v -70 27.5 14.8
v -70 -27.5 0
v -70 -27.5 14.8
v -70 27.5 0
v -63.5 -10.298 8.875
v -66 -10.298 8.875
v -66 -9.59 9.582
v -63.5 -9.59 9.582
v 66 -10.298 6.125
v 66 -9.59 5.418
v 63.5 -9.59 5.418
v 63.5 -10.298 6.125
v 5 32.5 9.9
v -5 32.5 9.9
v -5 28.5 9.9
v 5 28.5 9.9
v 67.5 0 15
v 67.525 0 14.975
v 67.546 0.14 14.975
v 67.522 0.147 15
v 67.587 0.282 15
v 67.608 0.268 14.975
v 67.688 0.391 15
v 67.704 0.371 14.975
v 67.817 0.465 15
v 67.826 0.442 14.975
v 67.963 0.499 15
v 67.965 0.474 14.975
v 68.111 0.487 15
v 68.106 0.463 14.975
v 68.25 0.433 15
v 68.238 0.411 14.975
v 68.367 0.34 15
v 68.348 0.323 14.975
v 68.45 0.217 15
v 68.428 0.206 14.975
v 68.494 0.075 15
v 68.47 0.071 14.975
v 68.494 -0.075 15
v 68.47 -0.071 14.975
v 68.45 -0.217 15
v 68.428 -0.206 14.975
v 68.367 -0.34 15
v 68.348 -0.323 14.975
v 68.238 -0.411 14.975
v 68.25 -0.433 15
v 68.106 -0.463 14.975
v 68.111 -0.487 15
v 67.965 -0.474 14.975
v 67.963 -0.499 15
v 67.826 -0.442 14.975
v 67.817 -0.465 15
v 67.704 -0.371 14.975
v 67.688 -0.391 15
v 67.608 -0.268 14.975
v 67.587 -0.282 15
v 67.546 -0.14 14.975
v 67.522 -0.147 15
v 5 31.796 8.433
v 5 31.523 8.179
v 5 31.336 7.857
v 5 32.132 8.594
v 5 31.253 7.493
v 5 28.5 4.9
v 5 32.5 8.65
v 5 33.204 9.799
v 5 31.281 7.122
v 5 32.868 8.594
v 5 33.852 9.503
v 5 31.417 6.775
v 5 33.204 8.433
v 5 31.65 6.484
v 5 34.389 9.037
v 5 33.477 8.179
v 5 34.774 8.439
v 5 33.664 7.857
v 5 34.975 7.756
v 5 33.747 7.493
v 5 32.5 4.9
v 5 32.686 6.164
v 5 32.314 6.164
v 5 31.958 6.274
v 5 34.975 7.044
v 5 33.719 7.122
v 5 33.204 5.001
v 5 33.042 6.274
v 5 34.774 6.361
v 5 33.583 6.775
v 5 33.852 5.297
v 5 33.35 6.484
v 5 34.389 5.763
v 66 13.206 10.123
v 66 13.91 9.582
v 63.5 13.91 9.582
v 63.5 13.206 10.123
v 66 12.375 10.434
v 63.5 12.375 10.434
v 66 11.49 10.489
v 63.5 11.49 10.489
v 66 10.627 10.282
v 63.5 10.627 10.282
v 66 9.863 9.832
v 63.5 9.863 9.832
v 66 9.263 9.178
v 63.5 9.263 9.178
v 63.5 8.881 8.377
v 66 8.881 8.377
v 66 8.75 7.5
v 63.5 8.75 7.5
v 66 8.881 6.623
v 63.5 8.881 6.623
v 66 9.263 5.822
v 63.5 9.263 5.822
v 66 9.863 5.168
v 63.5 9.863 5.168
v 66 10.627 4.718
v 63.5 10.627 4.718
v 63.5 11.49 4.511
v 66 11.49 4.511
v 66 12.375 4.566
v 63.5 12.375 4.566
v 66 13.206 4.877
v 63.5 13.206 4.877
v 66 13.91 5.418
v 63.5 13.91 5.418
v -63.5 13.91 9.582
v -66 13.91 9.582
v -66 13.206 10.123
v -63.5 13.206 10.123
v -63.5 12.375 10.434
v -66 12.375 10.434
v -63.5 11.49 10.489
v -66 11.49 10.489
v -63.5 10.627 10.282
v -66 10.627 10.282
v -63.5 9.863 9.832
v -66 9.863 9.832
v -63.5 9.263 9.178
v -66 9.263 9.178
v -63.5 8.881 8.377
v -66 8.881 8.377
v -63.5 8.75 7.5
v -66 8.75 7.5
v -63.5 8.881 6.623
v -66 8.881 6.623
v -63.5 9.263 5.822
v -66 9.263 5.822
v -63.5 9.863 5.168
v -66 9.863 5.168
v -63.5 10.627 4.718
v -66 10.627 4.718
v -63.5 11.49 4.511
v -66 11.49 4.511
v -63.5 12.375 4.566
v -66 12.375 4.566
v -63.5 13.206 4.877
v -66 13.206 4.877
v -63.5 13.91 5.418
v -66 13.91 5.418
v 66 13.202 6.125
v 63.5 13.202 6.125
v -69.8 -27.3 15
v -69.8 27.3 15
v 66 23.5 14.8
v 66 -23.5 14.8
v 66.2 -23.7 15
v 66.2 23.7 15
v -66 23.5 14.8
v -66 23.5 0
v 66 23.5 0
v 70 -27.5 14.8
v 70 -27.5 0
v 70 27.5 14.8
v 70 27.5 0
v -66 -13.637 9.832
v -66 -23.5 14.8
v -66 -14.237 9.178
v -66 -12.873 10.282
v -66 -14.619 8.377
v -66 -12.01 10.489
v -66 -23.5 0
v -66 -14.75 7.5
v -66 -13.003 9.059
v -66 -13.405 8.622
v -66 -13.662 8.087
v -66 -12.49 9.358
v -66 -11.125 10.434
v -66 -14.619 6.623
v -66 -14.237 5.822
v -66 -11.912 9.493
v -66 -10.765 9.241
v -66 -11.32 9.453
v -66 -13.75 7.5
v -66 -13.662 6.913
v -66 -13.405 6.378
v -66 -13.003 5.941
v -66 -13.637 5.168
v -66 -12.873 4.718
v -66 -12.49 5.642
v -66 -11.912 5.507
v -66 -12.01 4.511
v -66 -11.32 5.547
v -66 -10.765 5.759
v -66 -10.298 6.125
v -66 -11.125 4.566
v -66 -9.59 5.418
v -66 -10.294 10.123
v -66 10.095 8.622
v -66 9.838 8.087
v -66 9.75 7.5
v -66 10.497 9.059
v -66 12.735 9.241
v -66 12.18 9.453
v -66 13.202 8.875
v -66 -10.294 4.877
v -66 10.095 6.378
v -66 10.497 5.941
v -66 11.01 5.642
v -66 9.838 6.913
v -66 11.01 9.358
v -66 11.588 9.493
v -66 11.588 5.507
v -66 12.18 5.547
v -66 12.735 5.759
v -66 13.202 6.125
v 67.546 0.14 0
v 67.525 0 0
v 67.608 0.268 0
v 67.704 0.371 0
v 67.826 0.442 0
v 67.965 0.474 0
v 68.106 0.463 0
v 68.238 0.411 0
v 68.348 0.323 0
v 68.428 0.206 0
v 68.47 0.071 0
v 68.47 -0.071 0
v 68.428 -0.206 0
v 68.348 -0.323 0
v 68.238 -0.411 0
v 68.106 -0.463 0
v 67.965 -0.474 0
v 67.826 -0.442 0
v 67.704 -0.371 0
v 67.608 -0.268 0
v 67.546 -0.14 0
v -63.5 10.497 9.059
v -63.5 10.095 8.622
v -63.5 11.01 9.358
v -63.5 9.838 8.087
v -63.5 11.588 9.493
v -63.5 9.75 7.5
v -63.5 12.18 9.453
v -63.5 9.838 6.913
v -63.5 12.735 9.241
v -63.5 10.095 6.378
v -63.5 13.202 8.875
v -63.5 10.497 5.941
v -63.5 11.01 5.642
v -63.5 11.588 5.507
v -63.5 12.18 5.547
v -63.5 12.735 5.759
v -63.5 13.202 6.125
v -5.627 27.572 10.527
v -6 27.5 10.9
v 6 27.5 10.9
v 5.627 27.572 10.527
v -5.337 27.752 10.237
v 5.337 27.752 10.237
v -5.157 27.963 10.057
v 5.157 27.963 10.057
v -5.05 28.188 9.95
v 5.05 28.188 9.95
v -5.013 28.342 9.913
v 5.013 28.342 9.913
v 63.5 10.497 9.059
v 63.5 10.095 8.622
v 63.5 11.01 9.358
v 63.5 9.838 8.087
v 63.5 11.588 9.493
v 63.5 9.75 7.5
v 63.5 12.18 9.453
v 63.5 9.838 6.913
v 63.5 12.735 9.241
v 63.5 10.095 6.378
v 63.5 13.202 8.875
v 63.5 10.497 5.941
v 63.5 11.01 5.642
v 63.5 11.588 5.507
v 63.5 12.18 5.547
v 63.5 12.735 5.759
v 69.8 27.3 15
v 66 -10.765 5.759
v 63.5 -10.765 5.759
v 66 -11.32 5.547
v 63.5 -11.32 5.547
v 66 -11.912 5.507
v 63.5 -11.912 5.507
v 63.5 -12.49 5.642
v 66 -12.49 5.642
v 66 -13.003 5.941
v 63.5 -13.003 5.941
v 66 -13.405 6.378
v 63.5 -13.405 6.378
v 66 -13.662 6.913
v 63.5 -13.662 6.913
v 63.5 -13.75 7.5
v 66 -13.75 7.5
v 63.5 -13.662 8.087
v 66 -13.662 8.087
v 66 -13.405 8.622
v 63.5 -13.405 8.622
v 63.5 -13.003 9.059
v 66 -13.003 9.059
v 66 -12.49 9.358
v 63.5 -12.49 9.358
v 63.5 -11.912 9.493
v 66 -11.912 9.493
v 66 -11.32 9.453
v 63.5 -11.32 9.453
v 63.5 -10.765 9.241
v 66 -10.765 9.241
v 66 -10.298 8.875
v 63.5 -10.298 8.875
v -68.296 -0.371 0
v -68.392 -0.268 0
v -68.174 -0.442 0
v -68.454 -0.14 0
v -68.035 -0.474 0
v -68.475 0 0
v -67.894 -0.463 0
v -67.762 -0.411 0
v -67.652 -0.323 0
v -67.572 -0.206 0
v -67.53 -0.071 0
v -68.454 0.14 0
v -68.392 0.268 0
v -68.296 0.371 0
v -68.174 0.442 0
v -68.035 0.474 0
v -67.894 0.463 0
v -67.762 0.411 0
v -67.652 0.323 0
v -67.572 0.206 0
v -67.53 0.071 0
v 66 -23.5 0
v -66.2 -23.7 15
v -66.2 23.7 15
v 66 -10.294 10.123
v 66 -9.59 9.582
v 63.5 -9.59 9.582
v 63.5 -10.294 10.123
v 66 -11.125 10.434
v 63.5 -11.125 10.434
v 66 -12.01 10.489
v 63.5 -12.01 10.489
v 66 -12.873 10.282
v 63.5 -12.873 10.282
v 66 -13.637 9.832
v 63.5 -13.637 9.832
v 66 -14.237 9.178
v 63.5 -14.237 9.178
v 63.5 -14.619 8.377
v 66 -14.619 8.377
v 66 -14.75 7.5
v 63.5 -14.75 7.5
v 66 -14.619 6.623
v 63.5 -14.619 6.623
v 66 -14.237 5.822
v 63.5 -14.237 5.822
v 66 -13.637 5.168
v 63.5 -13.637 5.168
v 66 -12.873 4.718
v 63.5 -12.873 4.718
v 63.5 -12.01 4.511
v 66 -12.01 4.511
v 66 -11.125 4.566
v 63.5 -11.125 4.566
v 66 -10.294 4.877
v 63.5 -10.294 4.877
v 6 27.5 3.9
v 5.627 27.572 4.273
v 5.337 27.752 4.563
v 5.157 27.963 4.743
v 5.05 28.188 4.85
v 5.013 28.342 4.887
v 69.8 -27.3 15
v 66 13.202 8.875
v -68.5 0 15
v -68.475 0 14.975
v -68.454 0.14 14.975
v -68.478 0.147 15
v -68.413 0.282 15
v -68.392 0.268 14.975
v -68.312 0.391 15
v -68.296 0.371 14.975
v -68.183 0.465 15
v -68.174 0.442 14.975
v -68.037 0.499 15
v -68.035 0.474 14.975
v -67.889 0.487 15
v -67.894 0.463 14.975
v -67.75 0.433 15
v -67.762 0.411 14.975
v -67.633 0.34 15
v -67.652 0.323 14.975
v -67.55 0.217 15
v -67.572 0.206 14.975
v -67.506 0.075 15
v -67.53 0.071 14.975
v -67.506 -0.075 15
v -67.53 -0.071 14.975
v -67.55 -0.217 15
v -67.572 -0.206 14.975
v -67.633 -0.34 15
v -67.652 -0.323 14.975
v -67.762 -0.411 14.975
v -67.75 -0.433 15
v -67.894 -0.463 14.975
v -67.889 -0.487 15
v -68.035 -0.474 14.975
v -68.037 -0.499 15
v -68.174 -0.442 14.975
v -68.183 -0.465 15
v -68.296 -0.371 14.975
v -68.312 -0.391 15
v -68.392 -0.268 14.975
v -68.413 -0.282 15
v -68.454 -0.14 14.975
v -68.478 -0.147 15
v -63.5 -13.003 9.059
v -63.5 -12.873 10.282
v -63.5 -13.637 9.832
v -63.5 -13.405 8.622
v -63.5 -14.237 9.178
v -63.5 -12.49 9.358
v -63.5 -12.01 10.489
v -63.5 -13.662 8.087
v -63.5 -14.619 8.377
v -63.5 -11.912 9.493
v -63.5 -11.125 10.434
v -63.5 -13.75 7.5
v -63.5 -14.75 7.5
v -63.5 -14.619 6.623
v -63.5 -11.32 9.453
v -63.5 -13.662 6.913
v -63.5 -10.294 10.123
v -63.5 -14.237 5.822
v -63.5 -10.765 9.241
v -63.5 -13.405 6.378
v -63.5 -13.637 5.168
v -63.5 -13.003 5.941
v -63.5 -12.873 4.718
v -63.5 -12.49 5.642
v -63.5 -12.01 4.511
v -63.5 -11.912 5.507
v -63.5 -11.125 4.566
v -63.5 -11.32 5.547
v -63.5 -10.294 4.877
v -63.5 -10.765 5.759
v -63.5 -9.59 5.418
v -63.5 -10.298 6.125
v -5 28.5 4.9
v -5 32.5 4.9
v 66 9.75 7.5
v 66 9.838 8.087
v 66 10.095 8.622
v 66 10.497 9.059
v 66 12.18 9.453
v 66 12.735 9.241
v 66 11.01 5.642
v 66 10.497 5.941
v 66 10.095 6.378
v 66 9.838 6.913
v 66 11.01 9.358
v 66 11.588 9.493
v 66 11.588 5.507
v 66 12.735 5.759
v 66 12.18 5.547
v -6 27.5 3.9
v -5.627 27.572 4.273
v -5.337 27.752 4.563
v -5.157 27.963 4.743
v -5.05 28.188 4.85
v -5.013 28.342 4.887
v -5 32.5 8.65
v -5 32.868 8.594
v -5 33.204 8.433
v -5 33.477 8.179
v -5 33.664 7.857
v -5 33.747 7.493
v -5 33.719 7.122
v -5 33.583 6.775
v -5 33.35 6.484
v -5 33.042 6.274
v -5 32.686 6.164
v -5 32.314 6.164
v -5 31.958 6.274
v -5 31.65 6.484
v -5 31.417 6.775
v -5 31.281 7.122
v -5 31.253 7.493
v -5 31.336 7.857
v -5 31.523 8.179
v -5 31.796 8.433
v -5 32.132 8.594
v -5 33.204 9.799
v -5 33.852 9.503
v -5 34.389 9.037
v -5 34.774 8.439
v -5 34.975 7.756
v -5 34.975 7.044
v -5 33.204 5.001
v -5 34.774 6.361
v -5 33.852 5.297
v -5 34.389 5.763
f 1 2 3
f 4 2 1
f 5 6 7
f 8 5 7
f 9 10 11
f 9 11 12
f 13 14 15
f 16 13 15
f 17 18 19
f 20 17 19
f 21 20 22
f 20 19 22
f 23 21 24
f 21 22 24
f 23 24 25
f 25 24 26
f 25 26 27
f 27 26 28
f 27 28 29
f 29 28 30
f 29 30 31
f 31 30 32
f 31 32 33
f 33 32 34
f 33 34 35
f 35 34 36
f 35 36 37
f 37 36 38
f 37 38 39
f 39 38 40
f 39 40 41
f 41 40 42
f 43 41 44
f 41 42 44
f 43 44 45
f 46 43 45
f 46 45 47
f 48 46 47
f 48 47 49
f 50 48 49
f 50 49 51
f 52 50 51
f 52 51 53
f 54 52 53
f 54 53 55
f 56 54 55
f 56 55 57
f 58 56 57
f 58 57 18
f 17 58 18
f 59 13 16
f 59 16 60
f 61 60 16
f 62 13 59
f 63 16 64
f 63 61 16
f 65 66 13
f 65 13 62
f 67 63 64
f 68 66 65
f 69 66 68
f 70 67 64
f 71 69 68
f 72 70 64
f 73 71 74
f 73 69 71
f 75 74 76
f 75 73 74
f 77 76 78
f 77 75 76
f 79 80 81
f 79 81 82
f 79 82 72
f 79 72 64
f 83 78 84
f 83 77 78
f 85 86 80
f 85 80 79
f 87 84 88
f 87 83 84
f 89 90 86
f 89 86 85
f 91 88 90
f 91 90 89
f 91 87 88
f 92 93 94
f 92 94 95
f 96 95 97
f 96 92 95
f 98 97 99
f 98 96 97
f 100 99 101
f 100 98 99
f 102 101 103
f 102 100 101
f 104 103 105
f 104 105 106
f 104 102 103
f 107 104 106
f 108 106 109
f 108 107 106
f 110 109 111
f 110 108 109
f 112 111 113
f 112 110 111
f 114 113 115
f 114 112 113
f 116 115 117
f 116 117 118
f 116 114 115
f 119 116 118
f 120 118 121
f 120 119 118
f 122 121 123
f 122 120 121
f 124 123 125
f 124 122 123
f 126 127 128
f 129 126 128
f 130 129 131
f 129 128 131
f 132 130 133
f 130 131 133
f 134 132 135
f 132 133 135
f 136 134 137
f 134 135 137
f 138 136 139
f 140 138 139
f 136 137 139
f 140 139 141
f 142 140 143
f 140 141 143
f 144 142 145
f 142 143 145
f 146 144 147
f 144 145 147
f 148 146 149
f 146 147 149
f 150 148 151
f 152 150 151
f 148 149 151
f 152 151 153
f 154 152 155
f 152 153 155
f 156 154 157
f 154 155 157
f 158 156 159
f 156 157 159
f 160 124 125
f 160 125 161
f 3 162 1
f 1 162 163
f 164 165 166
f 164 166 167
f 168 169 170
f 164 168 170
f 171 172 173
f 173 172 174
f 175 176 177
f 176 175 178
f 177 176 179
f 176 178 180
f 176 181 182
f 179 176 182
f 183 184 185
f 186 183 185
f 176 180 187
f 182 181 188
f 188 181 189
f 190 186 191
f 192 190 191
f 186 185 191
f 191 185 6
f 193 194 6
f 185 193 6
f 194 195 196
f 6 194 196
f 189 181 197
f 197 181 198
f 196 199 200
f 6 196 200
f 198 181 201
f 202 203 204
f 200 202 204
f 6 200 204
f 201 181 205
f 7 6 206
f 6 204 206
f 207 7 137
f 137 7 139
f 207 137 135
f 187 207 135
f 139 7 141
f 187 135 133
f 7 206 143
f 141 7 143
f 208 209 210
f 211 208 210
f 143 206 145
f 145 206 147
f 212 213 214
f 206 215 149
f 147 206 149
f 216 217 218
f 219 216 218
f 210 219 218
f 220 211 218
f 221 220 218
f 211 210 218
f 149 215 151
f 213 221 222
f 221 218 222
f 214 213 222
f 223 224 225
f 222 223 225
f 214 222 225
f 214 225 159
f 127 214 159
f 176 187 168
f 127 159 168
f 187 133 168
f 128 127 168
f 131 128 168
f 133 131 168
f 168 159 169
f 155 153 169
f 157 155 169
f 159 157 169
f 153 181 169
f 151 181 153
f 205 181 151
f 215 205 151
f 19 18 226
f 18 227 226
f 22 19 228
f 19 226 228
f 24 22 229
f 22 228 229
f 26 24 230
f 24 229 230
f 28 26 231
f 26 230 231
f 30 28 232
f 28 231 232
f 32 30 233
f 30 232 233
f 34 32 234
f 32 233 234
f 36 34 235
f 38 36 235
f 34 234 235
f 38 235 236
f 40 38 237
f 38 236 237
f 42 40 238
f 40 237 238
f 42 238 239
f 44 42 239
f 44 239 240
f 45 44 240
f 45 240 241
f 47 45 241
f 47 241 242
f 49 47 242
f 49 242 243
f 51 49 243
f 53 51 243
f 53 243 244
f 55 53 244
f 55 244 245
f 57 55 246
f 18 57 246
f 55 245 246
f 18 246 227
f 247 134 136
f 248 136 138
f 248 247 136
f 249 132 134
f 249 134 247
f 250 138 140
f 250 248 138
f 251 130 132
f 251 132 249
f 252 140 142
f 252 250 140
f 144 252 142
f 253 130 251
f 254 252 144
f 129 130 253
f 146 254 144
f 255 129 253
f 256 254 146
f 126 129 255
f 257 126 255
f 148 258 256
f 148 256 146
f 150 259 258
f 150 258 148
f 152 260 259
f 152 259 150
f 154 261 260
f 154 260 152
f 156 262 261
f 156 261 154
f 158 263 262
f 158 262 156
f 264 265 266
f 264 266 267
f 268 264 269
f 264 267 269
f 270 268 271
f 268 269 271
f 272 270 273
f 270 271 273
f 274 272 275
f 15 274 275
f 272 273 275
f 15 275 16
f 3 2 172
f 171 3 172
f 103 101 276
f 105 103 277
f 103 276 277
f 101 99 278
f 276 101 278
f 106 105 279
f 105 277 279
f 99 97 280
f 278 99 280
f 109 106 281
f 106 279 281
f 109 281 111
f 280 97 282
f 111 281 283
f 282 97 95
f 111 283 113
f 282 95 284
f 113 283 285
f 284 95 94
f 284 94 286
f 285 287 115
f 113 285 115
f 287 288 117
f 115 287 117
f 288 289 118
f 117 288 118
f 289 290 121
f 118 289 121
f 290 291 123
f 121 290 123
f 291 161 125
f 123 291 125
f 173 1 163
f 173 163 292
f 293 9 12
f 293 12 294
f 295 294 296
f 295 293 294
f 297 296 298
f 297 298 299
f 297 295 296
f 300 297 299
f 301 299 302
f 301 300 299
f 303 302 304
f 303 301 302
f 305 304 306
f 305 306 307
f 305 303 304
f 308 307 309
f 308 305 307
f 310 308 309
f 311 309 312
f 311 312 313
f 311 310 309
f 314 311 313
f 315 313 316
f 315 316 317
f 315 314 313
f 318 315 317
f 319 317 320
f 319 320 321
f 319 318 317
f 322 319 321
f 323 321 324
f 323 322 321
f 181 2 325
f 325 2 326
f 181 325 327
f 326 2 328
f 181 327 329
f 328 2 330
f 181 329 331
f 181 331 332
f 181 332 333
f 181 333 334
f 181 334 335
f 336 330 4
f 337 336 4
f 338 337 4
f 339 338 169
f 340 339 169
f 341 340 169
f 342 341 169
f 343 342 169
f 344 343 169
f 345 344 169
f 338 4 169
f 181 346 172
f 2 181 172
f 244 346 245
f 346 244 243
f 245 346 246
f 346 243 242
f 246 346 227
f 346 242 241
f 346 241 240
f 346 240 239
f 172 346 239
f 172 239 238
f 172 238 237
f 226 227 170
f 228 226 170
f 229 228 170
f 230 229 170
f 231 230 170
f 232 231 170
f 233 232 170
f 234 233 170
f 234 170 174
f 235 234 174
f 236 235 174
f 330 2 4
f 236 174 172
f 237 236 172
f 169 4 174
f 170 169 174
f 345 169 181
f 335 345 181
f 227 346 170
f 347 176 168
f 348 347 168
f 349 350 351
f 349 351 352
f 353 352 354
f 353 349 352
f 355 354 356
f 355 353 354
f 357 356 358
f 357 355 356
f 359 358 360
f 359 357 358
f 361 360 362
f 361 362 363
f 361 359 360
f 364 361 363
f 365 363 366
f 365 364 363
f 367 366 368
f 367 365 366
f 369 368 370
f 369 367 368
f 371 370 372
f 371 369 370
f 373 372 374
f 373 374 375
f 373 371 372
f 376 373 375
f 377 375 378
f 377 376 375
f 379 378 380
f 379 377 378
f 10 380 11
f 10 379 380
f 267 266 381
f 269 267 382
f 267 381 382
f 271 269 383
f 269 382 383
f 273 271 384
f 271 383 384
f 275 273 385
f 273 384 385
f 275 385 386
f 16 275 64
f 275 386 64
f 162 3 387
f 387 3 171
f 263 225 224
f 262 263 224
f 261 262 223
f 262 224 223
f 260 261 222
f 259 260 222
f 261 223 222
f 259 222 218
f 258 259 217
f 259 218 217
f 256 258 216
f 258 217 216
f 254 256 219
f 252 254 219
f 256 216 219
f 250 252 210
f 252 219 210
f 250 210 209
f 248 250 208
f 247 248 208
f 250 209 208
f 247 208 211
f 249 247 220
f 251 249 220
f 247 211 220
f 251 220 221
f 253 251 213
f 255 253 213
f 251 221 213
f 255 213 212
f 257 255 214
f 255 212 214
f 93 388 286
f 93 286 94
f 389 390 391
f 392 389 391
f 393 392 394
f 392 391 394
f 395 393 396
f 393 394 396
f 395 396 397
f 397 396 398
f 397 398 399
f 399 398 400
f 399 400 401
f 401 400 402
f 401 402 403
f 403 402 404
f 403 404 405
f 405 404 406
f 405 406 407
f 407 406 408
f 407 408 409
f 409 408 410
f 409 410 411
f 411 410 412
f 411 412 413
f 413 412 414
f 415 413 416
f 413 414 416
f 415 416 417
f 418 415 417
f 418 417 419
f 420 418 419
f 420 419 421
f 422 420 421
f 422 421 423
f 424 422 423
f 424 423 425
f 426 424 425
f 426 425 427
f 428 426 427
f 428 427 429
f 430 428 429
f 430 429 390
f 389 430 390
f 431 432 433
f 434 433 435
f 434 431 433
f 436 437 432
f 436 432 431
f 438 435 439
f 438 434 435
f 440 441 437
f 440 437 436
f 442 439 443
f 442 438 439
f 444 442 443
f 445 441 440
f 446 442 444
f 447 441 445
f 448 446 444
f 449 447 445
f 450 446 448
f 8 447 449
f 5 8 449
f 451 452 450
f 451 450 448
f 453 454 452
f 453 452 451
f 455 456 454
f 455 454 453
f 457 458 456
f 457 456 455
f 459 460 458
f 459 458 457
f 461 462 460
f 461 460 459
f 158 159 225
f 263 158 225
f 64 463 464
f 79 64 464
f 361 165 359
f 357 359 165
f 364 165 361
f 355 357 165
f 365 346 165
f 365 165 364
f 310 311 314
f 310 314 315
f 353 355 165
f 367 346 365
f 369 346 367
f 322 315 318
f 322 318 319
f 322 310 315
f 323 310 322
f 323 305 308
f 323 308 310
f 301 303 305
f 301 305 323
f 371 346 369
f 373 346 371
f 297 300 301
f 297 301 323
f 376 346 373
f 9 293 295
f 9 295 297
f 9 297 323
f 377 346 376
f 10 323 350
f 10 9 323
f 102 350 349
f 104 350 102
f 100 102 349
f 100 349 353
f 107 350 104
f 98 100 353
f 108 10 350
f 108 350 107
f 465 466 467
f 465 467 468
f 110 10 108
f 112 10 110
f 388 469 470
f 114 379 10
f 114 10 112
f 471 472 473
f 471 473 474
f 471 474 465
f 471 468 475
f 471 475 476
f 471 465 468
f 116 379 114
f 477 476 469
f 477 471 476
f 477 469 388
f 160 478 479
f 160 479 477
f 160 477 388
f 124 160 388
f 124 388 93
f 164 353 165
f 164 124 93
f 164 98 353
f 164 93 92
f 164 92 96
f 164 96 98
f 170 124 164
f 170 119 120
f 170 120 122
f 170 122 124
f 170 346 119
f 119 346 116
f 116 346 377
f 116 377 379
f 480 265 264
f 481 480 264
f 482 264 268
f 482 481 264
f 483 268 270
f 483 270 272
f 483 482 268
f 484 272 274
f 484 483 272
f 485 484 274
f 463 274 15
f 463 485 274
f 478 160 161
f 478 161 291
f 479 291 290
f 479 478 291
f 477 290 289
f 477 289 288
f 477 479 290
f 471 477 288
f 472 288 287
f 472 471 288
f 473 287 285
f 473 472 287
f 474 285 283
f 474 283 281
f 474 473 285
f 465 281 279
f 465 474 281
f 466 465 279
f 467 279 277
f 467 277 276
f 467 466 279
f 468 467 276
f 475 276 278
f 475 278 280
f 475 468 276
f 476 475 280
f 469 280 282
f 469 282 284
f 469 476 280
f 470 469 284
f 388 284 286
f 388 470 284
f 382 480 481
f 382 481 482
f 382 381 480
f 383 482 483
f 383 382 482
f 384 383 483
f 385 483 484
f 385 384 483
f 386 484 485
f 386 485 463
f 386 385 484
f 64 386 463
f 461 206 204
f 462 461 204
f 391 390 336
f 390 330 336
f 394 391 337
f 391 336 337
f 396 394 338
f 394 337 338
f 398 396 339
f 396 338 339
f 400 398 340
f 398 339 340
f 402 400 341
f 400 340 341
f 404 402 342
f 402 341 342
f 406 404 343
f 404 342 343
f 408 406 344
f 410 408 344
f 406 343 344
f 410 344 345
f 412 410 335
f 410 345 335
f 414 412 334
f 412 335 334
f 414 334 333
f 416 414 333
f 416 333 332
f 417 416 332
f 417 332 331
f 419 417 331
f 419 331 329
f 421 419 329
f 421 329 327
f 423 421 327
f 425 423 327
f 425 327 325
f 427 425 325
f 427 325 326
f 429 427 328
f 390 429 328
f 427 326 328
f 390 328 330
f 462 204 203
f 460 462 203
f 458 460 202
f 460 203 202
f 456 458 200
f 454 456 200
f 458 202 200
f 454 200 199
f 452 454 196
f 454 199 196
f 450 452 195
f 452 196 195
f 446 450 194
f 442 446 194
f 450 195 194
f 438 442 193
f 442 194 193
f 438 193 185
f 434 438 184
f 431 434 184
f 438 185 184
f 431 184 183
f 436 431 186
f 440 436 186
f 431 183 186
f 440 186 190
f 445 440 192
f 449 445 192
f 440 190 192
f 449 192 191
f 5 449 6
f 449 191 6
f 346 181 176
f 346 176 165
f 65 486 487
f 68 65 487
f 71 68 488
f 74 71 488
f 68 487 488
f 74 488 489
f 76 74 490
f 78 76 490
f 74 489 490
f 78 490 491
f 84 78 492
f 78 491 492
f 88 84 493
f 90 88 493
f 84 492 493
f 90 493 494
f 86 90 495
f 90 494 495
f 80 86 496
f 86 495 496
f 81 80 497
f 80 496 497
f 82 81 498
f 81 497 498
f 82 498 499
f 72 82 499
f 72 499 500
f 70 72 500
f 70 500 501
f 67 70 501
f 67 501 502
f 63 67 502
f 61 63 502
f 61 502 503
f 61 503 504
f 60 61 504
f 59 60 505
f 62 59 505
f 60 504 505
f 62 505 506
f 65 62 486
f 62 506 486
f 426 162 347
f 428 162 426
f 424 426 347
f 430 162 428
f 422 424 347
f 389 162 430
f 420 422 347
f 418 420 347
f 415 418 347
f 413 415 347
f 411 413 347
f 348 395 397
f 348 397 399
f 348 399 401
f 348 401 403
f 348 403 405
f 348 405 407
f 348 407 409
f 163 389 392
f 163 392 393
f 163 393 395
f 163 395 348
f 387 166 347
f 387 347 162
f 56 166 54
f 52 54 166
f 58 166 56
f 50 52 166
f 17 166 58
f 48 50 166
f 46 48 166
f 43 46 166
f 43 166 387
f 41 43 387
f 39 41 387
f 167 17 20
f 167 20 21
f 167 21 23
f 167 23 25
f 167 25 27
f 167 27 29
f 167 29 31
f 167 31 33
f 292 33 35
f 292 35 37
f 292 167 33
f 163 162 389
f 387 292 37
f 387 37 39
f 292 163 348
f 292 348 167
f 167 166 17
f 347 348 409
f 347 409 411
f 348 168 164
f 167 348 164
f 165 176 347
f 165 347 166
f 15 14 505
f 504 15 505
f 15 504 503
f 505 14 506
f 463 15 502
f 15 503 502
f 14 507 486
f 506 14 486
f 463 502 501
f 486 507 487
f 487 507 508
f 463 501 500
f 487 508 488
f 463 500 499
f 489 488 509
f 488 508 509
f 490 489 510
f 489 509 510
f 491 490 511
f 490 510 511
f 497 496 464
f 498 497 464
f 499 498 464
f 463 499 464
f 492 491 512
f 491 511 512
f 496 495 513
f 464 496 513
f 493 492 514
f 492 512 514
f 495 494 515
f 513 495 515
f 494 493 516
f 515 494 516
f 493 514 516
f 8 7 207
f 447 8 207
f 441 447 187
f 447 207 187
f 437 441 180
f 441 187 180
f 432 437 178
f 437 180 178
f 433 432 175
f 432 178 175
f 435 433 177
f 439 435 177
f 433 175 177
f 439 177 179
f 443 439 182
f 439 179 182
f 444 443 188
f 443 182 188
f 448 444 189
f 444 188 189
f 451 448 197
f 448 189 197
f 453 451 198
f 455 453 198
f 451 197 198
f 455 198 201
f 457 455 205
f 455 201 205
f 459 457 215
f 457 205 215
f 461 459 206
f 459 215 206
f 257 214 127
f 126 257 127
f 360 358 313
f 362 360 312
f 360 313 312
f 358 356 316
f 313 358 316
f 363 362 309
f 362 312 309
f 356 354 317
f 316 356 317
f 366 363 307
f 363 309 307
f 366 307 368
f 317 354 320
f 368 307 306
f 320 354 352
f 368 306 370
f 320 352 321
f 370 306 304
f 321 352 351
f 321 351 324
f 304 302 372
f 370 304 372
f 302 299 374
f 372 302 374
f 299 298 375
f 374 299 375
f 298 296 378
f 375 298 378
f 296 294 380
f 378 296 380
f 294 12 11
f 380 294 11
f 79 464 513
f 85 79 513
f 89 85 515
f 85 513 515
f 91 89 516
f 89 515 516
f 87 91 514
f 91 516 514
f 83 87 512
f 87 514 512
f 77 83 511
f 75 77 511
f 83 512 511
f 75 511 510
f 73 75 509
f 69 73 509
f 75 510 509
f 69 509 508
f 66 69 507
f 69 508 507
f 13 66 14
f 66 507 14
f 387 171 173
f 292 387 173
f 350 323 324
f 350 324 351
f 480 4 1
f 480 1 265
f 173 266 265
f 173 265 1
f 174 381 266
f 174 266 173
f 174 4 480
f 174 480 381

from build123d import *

# Parameters (mm, degrees)
SKETCH1_W                                = 140
SKETCH1_H                                = 55
SKETCH1_W_2                              = 132
SKETCH1_H_2                              = 47
RECTANGLE_PAD_DEPTH                      = 15
MOUNTINGHOLES_DEPTH                      = 2.5
TAP_DRILL_FOR_M1_2X0_25_TAP2_D           = 0.95
TAP_DRILL_FOR_M1_2X0_25_TAP2_CSINK_D     = 1
TAP_DRILL_FOR_M1_2X0_25_TAP2_CSINK_ANGLE = 90
CHAMFER3_SIZE                            = 0.2
BOSS_EXTRUDE1_DEPTH                      = 10
FILLET1_R                                = 1
SKETCH7_R                                = 1.25
CUT_EXTRUDE1_DEPTH                       = 10


with BuildPart() as part:
    # Sketch1 → Rectangle Pad (new body)
    with BuildSketch(Plane.XY):
        Rectangle(SKETCH1_W, SKETCH1_H)
        Rectangle(SKETCH1_W_2, SKETCH1_H_2, mode=Mode.SUBTRACT)
    extrude(amount=RECTANGLE_PAD_DEPTH)

    # Sketch2 → MountingHoles (add)
    with BuildSketch(Plane.ZY.offset(-66)):
        with BuildLine():
            Line((8.875, 13.202368755), (9.582283213, 13.909651968))
            ThreePointArc((9.582283213, 13.909651968), (7.5, 8.75), (5.417716787, 13.909651968))
            Line((5.417716787, 13.909651968), (6.125, 13.202368755))
            ThreePointArc((6.125, 13.202368755), (7.5, 9.75), (8.875, 13.202368755))
        make_face()
        with BuildLine():
            Line((8.875, -10.297631245), (9.582283213, -9.590348032))
            ThreePointArc((9.582283213, -9.590348032), (7.5, -14.75), (5.417716787, -9.590348032))
            Line((5.417716787, -9.590348032), (6.125, -10.297631245))
            ThreePointArc((6.125, -10.297631245), (7.5, -13.75), (8.875, -10.297631245))
        make_face()
    mountingholes = extrude(amount=MOUNTINGHOLES_DEPTH)

    # Mirror1: MountingHoles across plane
    add(mountingholes.mirror(Plane(origin=(0, 0, 0), x_dir=(0, 0, 1), z_dir=(1, 0, 0))))

    # Tap Drill for M1.2x0.25 Tap2 (through all)
    with Locations(Plane.XY.offset(15)):
        with Locations((68, 0), (-68, 0)):
            CounterSinkHole(TAP_DRILL_FOR_M1_2X0_25_TAP2_D / 2, TAP_DRILL_FOR_M1_2X0_25_TAP2_CSINK_D / 2, counter_sink_angle=TAP_DRILL_FOR_M1_2X0_25_TAP2_CSINK_ANGLE)

    # Chamfer3
    chamfer3_edges = [part.edges().sort_by_distance(p)[0] for p in [
        (-70, 0, 15),
        (66, 0, 15),
        (0, -27.5, 15),
        (0, 23.5, 15),
        (-66, 0, 15),
        (0, -23.5, 15),
        (70, 0, 15),
        (0, 27.5, 15),
    ]]
    chamfer(chamfer3_edges, length=CHAMFER3_SIZE)

    # Sketch6 → Boss-Extrude1 (add)
    with BuildSketch(Plane(origin=(-5, 0, 0), x_dir=(0, 0, -1), z_dir=(1, 0, 0))):
        with BuildLine():
            Line((-9.9, 32.5), (-9.9, 27.5))
            Line((-9.9, 27.5), (-4.9, 27.5))
            Line((-4.9, 27.5), (-4.9, 32.5))
            ThreePointArc((-4.9, 32.5), (-7.4, 35), (-9.9, 32.5))
        make_face()
    extrude(amount=BOSS_EXTRUDE1_DEPTH)

    # Fillet1
    fillet1_edges = [part.edges().sort_by_distance(p)[0] for p in [
        (-5, 27.5, 7.4),
        (0, 27.5, 9.9),
        (0, 27.5, 4.9),
        (5, 27.5, 7.4),
    ]]
    fillet(fillet1_edges, radius=FILLET1_R)

    # Sketch7 → Cut-Extrude1 (cut)
    with BuildSketch(Plane.ZY.offset(5)):
        with Locations((7.4, 32.5)):
            Circle(SKETCH7_R)
    extrude(amount=-CUT_EXTRUDE1_DEPTH, mode=Mode.SUBTRACT)


solid = part.part
